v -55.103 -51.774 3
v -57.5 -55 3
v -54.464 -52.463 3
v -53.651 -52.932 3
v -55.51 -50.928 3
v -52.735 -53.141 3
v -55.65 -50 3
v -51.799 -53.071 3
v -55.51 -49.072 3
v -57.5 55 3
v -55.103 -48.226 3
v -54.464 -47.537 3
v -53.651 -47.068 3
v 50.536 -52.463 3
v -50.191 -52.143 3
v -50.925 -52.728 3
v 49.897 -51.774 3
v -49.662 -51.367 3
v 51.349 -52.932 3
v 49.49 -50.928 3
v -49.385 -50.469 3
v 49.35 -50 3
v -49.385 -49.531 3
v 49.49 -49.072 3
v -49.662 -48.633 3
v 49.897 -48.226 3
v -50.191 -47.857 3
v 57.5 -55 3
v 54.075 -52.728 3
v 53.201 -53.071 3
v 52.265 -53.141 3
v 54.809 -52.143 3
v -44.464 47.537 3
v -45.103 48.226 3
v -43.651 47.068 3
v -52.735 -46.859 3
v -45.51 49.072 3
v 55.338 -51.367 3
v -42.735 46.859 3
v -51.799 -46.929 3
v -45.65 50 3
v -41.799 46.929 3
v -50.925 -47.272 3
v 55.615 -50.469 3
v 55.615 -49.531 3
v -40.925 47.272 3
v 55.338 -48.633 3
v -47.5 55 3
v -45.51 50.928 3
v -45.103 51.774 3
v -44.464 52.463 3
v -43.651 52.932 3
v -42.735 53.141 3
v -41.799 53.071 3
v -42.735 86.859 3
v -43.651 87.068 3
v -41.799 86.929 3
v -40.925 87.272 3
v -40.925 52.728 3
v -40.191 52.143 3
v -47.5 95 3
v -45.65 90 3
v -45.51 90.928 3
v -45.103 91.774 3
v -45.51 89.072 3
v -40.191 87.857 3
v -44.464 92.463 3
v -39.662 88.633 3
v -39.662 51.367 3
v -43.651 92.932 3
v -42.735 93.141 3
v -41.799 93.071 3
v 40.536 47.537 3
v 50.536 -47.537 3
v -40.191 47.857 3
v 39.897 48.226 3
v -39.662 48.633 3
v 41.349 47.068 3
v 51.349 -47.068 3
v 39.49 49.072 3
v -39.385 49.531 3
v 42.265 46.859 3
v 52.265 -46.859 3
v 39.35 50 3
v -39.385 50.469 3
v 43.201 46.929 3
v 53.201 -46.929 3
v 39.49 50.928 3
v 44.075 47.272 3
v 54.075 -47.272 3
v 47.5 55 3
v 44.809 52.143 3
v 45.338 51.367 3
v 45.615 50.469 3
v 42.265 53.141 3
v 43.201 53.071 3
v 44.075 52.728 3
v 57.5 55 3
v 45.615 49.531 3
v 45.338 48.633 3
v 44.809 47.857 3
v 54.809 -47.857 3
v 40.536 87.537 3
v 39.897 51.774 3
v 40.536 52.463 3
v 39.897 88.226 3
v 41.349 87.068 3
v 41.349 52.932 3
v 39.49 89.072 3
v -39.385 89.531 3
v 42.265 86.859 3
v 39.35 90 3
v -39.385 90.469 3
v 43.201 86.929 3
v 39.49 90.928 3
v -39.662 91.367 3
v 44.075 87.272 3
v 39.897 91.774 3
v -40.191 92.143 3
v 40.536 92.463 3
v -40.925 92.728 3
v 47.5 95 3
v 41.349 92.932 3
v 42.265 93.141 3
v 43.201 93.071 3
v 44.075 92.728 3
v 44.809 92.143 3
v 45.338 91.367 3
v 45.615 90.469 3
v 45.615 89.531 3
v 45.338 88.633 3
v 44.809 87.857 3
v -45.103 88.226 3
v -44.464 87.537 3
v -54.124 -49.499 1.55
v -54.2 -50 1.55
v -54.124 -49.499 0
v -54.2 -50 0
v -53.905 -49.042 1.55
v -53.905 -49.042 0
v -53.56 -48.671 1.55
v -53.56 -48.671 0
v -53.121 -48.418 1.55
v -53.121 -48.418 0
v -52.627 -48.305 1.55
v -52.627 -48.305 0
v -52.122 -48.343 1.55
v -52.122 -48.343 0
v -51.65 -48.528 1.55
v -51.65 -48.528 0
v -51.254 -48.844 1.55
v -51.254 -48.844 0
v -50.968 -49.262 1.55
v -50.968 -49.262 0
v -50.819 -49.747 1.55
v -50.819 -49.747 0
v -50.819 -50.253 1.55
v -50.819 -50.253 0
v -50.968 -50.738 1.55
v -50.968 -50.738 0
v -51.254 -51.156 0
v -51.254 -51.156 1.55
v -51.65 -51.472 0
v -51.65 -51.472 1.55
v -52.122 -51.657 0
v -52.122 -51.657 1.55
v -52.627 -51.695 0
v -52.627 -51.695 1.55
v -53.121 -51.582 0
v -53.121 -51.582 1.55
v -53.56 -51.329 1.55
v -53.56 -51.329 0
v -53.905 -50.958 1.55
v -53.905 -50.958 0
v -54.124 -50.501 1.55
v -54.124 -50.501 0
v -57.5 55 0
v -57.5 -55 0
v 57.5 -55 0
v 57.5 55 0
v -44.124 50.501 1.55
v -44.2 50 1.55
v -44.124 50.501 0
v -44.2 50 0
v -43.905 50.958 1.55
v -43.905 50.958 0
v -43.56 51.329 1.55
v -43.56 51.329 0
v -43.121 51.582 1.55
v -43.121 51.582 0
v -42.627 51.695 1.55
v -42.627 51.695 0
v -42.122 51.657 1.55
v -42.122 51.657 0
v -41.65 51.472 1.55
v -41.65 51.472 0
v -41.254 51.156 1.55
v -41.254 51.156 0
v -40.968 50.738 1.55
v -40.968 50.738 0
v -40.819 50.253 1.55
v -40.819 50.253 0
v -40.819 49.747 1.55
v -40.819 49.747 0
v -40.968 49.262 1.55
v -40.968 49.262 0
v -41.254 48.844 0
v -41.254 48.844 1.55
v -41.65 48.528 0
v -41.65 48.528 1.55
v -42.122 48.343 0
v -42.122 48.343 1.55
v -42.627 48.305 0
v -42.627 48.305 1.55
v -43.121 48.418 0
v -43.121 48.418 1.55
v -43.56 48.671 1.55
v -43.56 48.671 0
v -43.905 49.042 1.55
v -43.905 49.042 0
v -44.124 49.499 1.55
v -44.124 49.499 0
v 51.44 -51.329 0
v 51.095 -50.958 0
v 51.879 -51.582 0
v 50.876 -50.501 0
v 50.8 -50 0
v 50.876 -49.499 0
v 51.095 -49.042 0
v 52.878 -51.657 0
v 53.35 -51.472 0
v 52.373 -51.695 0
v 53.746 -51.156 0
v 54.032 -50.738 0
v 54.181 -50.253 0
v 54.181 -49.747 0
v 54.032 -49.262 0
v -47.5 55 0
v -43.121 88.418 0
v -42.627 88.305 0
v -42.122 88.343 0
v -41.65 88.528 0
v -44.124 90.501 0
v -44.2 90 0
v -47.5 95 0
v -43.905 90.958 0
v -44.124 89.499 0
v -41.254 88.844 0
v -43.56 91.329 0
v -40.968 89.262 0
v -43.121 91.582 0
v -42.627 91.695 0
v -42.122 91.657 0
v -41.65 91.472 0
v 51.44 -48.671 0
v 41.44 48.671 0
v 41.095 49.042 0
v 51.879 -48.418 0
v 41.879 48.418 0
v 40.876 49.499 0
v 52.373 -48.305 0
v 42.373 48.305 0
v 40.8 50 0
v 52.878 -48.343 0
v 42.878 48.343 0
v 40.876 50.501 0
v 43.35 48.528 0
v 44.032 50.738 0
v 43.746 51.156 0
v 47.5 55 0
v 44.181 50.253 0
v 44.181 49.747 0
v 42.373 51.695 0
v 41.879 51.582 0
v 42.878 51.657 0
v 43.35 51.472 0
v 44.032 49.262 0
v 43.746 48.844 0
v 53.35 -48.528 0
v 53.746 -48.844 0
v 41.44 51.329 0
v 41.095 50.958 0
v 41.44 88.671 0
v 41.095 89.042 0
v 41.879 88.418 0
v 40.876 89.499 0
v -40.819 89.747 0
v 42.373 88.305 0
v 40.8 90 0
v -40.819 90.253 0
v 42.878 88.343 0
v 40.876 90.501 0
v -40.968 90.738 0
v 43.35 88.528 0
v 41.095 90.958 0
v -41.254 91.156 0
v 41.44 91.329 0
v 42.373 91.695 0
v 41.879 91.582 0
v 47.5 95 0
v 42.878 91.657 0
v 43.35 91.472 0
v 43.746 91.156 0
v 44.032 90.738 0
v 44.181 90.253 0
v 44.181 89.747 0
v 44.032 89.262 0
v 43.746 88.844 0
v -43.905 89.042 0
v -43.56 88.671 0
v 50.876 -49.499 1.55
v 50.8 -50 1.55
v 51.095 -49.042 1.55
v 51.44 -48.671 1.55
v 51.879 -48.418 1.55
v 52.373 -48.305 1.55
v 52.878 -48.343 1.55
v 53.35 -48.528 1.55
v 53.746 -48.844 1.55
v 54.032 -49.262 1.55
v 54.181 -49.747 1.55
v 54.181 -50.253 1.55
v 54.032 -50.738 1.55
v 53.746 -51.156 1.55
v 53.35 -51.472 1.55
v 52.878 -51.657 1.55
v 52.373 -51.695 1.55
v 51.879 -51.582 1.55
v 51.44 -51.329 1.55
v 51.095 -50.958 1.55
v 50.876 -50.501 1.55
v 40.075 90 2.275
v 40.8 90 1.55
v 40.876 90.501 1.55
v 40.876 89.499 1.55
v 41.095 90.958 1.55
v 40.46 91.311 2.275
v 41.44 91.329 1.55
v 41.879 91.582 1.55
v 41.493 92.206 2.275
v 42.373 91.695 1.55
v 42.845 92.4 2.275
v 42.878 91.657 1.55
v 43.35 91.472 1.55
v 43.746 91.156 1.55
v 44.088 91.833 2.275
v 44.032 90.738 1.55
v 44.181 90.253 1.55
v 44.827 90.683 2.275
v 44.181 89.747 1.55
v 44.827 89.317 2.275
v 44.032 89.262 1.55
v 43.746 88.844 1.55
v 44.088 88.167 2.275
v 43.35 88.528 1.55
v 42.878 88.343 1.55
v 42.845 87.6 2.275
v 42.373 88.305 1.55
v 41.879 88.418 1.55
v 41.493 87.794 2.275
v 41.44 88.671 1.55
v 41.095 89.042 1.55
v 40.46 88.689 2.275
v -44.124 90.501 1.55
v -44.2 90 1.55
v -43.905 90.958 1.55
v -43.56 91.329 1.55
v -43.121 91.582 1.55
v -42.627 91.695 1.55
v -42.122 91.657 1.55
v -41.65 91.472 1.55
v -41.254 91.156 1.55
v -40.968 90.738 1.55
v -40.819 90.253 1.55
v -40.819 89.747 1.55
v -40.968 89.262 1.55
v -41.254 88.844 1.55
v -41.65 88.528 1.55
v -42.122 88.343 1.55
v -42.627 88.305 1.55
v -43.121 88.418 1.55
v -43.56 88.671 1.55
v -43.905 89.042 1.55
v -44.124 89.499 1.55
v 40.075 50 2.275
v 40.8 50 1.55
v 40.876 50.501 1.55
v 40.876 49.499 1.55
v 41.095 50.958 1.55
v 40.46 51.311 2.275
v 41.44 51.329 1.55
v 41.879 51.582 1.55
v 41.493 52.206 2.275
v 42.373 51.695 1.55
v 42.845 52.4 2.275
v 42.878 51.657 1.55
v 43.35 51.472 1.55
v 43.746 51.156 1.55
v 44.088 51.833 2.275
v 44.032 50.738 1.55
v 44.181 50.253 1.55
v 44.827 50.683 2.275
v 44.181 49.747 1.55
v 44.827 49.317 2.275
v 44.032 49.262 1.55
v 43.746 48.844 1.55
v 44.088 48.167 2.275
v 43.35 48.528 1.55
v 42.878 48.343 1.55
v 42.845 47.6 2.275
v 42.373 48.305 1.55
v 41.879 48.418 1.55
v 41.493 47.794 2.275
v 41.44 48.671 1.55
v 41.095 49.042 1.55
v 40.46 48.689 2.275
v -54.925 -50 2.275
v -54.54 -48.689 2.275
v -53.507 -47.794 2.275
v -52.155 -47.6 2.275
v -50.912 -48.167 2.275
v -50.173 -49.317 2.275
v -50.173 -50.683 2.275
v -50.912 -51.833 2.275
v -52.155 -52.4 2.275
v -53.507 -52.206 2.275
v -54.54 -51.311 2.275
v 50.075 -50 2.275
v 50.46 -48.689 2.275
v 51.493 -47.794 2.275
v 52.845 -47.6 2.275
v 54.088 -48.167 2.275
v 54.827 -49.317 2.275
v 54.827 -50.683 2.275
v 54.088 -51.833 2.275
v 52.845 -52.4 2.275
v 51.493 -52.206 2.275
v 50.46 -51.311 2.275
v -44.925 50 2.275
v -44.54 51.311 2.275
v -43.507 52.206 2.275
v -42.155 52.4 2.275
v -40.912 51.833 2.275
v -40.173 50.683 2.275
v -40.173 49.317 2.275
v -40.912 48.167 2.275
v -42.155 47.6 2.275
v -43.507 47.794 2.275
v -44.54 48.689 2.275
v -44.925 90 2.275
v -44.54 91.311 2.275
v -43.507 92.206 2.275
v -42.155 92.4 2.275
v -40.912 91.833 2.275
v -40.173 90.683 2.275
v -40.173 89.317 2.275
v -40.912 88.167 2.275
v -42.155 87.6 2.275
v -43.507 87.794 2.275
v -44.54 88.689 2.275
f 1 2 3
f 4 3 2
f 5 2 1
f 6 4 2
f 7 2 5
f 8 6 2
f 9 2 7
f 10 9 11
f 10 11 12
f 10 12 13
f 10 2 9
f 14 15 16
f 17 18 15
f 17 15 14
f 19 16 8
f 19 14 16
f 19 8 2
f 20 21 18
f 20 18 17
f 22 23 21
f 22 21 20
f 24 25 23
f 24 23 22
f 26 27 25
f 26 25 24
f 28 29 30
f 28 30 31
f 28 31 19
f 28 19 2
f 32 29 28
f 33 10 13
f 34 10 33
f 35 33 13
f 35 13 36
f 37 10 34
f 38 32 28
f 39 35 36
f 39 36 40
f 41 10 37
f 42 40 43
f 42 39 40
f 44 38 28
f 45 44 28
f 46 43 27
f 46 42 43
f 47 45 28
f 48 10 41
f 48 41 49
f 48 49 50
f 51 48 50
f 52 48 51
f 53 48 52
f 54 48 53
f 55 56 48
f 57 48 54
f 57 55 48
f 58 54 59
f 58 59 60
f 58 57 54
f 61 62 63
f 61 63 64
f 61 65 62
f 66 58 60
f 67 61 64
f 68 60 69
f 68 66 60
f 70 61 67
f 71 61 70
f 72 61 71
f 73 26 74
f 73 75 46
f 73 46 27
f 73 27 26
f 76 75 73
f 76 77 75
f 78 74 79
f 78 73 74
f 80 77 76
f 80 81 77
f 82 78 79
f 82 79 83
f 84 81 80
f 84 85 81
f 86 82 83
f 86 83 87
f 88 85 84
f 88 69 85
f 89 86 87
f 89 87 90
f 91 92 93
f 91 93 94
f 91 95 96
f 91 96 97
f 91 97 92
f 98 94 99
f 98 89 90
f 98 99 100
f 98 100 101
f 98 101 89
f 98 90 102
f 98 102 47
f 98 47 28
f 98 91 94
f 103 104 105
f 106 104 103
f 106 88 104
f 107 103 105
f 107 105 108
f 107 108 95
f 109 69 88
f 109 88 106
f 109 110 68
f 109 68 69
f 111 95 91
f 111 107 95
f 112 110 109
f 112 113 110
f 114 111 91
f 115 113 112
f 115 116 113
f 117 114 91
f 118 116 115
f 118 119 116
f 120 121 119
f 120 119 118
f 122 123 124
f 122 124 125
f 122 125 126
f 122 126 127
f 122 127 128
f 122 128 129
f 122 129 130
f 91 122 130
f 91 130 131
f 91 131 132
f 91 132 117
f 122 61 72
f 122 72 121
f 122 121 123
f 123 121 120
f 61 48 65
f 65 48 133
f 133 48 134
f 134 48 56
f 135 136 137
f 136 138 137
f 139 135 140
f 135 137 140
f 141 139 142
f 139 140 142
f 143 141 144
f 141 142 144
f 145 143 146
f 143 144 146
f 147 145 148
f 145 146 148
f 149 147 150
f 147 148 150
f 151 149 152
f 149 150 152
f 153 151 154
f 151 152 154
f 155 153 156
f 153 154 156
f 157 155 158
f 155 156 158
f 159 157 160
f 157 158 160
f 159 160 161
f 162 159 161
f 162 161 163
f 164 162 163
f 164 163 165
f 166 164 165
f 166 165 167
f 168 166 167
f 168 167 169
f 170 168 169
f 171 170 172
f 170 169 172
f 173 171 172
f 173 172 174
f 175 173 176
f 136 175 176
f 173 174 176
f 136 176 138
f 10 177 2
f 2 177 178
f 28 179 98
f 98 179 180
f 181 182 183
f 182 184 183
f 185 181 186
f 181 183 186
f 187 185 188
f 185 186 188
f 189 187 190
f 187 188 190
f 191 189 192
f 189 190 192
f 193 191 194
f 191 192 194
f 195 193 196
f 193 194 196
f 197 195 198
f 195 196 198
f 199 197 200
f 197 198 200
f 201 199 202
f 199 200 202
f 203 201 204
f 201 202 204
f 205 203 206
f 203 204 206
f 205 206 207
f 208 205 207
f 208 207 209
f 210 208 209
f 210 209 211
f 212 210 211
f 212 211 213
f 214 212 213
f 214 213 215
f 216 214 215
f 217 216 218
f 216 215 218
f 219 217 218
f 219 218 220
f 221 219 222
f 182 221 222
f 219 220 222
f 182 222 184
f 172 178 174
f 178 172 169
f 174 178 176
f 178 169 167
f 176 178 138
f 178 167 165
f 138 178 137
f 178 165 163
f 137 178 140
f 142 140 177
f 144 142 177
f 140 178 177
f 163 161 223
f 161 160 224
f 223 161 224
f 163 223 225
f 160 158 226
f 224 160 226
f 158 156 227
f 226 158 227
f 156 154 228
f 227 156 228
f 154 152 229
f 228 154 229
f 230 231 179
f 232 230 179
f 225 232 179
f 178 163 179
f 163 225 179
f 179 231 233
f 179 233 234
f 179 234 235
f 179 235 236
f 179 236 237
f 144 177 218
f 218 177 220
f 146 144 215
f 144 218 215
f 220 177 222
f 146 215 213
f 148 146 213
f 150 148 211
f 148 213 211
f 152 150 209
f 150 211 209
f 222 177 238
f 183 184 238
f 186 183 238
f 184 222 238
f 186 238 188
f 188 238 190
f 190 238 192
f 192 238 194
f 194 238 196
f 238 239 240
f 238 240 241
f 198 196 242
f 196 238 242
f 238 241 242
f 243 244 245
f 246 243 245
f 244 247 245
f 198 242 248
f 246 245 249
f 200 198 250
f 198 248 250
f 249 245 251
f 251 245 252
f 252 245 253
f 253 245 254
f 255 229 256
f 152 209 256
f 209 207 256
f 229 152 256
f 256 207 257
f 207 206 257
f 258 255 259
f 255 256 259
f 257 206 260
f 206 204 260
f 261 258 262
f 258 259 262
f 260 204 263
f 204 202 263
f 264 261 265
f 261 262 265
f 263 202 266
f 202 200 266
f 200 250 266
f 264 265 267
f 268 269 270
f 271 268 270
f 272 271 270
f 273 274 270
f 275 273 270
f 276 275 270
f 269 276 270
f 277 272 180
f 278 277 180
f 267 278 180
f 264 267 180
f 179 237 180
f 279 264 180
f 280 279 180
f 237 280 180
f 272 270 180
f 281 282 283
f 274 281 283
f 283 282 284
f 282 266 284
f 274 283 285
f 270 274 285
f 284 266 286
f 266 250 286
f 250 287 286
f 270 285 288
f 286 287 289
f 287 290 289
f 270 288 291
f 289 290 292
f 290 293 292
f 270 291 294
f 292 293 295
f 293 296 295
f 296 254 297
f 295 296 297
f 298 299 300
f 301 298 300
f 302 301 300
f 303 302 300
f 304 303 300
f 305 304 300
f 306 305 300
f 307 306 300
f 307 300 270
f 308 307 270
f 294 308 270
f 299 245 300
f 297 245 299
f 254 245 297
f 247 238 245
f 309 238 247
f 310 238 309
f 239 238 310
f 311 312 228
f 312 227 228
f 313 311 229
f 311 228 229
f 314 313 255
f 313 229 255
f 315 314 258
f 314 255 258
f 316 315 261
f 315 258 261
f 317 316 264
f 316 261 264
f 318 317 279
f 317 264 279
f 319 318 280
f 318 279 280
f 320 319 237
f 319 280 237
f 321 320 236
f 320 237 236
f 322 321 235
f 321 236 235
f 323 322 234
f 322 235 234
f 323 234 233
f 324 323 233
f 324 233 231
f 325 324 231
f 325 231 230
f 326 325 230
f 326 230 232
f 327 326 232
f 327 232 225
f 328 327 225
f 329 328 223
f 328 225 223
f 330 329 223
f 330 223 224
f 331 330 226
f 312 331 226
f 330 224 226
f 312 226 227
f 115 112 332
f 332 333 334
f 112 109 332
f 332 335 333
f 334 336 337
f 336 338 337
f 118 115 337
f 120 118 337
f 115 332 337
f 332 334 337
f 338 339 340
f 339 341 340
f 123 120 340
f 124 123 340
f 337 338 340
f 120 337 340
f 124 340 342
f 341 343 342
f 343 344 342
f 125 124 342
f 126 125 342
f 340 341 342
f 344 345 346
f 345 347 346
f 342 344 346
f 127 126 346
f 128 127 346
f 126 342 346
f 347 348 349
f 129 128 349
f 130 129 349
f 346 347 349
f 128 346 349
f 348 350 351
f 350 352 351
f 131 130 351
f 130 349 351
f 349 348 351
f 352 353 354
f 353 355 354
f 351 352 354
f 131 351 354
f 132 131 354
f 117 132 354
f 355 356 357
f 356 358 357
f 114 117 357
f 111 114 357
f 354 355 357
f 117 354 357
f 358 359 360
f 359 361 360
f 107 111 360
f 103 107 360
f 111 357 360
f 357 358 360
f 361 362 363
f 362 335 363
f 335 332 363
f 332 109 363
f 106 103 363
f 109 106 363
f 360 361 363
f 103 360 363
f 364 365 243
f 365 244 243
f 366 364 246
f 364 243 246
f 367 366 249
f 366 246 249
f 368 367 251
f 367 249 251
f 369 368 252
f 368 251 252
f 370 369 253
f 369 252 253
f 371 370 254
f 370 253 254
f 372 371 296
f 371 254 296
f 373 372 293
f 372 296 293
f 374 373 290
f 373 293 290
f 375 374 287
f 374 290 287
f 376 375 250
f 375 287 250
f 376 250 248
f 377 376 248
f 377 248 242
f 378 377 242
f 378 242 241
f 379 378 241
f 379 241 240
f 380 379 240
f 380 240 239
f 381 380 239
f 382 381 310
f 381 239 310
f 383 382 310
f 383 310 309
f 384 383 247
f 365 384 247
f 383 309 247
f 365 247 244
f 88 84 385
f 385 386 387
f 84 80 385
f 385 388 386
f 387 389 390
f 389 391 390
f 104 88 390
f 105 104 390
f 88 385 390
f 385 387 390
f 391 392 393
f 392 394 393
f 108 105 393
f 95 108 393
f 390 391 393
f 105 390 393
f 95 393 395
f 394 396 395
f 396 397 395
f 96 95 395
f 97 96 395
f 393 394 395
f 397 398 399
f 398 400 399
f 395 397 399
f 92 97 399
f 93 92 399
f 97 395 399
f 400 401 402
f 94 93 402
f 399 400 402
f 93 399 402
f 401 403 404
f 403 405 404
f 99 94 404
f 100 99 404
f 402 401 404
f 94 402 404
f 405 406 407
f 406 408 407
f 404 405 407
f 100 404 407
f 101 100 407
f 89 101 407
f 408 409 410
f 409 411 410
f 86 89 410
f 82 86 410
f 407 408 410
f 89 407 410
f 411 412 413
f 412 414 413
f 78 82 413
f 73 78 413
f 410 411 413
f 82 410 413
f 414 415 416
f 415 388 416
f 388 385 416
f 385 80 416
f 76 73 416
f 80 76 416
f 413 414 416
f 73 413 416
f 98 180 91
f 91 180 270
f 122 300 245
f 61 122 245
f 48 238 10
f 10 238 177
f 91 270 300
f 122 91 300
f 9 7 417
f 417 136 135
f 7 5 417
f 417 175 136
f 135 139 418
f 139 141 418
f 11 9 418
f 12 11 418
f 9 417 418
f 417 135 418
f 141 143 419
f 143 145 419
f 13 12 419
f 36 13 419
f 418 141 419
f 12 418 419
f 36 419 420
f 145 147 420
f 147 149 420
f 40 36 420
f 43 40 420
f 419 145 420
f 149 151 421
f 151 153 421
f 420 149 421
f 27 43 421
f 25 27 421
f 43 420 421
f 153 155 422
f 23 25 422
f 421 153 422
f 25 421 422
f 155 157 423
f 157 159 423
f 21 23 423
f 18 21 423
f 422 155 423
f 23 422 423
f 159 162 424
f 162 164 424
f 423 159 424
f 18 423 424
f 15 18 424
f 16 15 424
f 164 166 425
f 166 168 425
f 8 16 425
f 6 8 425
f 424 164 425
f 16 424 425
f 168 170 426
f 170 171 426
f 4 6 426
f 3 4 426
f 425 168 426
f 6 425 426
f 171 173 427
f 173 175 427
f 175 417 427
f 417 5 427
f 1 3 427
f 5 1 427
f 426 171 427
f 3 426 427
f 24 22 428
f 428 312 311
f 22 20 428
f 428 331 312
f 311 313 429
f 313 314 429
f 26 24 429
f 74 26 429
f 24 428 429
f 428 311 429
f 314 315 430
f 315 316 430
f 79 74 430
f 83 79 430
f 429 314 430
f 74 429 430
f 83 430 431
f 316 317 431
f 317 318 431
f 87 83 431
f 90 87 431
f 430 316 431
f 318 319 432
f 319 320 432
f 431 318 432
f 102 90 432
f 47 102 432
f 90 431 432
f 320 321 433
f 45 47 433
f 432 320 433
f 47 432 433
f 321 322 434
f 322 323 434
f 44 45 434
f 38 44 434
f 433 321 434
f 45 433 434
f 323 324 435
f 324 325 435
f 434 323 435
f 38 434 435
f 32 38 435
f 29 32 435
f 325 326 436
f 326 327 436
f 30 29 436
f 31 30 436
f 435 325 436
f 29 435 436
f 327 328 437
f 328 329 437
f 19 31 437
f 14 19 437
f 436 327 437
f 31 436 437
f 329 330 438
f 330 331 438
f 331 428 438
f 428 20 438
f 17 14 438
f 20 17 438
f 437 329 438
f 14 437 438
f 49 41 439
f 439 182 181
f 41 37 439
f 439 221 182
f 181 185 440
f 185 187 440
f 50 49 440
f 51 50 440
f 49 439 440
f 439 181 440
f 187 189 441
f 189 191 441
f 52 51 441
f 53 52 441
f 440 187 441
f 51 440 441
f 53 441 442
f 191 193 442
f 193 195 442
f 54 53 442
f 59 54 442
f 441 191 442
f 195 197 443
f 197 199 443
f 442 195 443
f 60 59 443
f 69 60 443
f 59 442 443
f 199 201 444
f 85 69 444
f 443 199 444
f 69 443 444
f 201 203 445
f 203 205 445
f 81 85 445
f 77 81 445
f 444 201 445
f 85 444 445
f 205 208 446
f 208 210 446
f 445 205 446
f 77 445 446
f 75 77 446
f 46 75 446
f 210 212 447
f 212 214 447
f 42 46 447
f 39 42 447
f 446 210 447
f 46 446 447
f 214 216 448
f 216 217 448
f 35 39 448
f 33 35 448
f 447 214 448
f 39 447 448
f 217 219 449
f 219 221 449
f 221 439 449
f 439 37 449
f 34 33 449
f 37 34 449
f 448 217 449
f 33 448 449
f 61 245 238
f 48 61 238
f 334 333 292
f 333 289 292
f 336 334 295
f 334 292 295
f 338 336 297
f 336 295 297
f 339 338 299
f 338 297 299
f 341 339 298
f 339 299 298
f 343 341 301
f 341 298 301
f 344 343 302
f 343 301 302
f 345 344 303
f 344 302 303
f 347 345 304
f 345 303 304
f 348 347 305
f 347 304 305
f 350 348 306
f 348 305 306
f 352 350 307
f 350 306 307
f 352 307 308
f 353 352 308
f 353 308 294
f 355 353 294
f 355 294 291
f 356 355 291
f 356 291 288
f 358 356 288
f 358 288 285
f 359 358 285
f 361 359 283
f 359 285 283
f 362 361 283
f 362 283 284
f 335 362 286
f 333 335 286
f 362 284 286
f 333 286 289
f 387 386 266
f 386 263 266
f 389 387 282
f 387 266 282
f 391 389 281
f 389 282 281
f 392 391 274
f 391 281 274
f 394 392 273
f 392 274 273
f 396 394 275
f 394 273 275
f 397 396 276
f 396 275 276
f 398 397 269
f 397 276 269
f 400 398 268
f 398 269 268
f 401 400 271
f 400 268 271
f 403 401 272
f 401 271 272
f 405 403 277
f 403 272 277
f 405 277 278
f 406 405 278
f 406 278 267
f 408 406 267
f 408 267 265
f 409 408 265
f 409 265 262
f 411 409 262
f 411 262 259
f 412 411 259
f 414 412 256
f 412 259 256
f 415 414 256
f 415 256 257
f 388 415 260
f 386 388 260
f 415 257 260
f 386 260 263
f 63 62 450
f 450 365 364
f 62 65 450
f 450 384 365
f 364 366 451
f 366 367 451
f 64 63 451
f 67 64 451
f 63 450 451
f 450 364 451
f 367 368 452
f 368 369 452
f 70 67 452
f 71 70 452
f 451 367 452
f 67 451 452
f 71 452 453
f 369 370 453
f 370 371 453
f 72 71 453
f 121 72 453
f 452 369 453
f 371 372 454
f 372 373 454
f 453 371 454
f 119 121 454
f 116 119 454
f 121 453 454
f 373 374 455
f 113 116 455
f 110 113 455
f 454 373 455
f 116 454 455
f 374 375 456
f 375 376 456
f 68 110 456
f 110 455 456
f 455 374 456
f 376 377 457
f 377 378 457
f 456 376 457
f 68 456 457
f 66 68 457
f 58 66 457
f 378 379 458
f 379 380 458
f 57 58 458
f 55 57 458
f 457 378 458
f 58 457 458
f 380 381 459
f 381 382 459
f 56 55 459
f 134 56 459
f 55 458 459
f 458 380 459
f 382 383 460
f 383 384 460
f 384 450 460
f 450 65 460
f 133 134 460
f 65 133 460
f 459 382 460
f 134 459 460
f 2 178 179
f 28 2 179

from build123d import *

# Parameters (mm, degrees)
EXTRUDE_1_DEPTH              = 3
HOLE_WIZARD_M3_1_D           = 3.4
HOLE_WIZARD_M3_1_DEPTH       = 15
HOLE_WIZARD_M3_1_CSINK_D     = 6.3
HOLE_WIZARD_M3_1_CSINK_ANGLE = 90
HOLE_WIZARD_M3_1_TIP         = 1.021463052


with BuildPart() as part:
    # 草圖1 → 填料-伸長1 (new body)
    with BuildSketch(Plane.XY):
        Polygon((-57.5, -55), (57.5, -55), (57.5, 55), (47.5, 55), (47.5, 95), (-47.5, 95), (-47.5, 55), (-57.5, 55), align=None)
    extrude(amount=EXTRUDE_1_DEPTH)

    # M3 錐坑平頭螺釘的錐孔1
    with Locations(Plane.XY.offset(3)):
        with Locations((-52.5, -50), (-42.5, 90), (-42.5, 50), (42.5, 90), (42.5, 50), (52.5, -50)):
            CounterSinkHole(HOLE_WIZARD_M3_1_D / 2, HOLE_WIZARD_M3_1_CSINK_D / 2, depth=HOLE_WIZARD_M3_1_DEPTH, counter_sink_angle=HOLE_WIZARD_M3_1_CSINK_ANGLE)
            with Locations((0, 0, -(HOLE_WIZARD_M3_1_DEPTH + HOLE_WIZARD_M3_1_TIP / 2))):  # 118° drill point
                Cone(0, HOLE_WIZARD_M3_1_D / 2, HOLE_WIZARD_M3_1_TIP, mode=Mode.SUBTRACT)


solid = part.part
